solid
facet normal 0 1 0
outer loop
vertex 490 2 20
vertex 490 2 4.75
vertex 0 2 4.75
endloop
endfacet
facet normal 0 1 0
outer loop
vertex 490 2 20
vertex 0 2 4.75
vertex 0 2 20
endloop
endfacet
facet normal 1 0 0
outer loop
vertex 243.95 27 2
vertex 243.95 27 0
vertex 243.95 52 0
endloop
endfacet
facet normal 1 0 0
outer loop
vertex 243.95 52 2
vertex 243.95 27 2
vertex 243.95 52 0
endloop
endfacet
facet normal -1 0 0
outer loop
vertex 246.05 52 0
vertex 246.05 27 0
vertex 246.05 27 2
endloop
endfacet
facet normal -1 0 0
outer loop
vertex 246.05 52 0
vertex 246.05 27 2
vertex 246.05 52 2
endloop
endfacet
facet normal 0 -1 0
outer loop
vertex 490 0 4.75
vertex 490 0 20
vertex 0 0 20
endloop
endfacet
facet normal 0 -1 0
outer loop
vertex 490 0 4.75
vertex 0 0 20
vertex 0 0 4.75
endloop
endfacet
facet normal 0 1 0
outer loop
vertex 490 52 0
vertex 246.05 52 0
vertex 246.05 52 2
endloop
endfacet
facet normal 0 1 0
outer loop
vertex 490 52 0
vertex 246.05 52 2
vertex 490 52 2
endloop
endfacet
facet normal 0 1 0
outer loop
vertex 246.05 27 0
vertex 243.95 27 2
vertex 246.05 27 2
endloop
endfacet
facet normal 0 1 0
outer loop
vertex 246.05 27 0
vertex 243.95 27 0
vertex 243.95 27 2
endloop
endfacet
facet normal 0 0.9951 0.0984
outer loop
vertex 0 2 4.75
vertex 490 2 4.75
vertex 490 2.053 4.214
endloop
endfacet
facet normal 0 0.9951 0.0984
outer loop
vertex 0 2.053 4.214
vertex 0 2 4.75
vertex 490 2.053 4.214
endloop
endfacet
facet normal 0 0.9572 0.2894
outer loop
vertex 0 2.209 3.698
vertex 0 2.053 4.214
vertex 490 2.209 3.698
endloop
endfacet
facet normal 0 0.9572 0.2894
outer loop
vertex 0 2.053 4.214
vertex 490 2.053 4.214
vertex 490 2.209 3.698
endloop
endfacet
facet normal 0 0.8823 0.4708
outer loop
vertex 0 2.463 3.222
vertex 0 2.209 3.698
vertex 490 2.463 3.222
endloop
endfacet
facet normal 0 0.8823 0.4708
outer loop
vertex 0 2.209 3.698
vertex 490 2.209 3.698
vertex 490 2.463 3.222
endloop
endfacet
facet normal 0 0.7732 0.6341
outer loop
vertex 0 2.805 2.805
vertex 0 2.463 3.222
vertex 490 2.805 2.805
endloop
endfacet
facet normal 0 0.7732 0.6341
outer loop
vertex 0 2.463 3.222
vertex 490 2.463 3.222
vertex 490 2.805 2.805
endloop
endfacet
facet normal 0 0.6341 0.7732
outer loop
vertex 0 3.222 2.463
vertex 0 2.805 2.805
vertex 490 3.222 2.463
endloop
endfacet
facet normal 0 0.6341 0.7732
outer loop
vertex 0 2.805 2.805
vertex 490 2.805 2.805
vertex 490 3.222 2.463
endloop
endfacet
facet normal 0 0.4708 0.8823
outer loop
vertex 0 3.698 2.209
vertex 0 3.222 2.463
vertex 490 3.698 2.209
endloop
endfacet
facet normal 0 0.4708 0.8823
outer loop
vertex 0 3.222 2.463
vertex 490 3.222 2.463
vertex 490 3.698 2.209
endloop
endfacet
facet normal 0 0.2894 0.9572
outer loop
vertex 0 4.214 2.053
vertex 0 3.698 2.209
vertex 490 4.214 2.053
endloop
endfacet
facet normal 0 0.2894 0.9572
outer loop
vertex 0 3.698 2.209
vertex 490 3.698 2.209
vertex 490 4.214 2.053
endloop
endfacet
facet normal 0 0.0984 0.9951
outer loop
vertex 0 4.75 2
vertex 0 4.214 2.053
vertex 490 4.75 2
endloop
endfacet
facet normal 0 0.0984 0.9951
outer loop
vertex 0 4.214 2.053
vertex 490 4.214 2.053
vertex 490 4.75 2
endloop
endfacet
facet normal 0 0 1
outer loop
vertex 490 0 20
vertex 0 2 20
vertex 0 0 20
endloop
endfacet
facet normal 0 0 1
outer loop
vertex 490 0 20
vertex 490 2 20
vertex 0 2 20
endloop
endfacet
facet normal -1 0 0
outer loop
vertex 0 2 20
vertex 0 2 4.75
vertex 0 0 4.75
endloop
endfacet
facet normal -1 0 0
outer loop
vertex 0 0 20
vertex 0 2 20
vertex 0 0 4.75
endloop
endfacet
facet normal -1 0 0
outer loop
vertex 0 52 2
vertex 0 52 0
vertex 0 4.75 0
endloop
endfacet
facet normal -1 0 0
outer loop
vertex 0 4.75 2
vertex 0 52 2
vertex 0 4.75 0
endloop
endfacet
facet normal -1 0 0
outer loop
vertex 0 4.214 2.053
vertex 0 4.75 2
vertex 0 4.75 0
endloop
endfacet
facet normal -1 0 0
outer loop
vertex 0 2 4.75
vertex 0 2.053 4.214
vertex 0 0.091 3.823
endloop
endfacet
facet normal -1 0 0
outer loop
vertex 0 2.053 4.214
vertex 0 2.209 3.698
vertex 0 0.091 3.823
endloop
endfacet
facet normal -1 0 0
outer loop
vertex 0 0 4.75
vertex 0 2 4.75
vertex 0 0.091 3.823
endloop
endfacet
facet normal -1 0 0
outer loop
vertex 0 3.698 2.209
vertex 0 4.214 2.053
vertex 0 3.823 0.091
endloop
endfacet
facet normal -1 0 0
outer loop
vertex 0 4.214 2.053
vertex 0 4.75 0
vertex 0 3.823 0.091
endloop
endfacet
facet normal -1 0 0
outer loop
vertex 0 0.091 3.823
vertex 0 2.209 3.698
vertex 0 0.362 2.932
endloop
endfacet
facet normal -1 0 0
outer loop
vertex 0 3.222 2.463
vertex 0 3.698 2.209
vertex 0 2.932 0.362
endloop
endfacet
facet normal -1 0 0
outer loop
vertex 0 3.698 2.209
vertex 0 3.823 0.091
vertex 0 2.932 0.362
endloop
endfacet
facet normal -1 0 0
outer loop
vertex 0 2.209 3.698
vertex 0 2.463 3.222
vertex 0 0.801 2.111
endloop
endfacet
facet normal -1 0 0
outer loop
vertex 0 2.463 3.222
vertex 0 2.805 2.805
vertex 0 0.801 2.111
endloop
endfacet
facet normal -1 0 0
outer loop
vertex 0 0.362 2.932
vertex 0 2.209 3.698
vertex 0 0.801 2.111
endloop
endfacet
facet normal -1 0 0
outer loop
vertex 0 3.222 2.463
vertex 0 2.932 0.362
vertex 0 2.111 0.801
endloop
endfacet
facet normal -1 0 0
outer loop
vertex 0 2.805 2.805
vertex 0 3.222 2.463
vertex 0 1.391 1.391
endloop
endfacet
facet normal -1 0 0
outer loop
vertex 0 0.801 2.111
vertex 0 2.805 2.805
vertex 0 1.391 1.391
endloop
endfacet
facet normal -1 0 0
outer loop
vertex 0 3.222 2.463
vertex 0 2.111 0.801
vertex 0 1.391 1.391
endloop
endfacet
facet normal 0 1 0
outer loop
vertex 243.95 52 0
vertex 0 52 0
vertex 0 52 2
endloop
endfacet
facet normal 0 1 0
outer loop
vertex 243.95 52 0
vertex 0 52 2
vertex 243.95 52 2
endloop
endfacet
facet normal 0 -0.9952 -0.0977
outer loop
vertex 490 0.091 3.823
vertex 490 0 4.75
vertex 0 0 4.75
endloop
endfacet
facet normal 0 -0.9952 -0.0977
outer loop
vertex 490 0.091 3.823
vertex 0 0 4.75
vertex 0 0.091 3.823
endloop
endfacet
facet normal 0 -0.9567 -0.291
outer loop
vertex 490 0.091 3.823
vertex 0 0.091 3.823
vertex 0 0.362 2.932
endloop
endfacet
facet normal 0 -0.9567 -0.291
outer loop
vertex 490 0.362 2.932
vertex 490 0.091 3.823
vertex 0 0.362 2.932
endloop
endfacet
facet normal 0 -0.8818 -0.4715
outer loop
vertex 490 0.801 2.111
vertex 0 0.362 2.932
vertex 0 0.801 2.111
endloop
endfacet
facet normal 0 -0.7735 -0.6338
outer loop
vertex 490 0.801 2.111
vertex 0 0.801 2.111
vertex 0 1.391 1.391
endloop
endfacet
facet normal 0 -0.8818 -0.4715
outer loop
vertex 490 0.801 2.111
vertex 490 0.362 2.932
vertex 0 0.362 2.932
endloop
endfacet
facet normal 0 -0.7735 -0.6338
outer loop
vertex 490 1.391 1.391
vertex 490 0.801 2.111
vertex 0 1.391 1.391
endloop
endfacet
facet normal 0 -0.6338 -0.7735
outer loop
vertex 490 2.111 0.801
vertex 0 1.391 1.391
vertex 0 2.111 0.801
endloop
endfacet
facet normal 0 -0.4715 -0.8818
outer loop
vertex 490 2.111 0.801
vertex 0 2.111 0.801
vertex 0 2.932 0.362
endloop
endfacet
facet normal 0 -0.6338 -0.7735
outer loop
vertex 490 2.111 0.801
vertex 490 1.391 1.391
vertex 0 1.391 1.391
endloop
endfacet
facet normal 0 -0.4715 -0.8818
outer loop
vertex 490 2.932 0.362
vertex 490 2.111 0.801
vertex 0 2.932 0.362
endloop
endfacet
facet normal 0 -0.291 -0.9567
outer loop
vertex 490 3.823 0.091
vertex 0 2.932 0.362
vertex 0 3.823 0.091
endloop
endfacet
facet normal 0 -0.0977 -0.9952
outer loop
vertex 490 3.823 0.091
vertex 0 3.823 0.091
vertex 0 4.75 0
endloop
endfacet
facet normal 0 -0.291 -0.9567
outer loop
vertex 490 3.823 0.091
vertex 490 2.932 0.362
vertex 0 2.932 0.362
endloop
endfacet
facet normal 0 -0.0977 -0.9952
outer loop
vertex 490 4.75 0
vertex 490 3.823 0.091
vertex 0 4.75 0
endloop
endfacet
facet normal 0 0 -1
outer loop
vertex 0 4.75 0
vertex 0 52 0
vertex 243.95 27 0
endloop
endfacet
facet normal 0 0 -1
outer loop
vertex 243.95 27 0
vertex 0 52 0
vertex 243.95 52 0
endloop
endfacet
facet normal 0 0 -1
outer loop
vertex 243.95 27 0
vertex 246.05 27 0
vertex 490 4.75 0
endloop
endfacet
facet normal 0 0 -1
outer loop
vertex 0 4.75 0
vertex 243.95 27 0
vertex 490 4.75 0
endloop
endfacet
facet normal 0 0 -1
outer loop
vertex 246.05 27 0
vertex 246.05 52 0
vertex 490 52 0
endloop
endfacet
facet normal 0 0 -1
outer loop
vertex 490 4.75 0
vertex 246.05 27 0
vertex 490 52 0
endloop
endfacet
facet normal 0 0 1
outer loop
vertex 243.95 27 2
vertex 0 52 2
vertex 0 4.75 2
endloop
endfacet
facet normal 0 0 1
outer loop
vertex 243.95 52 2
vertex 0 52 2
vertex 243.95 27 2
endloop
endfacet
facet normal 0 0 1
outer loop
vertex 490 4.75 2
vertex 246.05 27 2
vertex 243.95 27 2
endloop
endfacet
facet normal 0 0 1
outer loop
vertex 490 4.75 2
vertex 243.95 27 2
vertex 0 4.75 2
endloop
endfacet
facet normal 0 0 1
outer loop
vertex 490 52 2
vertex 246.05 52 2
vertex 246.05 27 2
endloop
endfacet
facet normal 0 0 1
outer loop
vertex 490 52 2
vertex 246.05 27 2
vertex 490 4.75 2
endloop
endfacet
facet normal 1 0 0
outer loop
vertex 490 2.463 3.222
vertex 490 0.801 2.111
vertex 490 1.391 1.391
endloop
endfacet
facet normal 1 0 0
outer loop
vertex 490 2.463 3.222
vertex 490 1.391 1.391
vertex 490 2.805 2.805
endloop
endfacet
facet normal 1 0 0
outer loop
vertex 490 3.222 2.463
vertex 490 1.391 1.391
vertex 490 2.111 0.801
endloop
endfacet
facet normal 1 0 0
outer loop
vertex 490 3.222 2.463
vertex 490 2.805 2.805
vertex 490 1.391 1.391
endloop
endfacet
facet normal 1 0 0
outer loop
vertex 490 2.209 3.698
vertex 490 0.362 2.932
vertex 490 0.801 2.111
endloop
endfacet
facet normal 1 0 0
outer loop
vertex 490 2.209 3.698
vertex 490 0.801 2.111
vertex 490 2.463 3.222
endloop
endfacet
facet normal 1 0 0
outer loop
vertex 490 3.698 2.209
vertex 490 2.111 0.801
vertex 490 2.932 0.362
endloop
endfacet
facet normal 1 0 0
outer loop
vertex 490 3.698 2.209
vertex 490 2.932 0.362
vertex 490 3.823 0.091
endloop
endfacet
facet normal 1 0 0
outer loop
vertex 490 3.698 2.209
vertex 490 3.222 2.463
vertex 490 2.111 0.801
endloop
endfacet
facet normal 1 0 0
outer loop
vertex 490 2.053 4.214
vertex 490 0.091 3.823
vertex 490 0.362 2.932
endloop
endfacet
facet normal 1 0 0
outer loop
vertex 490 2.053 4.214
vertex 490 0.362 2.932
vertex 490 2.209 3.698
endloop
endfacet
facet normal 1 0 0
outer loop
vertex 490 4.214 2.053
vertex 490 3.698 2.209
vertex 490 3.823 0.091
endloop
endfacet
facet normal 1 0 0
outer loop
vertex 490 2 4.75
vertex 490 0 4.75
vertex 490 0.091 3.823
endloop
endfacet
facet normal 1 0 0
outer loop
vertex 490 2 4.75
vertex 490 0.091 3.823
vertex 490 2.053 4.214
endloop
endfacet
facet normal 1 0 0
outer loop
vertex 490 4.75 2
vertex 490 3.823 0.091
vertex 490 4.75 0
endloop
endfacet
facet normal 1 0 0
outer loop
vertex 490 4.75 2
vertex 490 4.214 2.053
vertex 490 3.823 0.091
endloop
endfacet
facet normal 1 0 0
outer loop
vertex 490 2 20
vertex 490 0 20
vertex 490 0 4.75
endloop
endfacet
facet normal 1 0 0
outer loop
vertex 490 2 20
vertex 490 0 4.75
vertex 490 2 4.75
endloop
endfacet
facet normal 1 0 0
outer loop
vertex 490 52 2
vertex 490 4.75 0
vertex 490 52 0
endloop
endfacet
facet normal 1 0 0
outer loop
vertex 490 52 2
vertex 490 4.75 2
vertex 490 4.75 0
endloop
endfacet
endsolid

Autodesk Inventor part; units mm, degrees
ref_plane "YZ Plane" through (0, 0, 0) normal (1, 0, 0) x (0, 1, 0)
ref_plane "XZ Plane" through (0, 0, 0) normal (0, 1, 0) x (-1, 0, 0)
ref_plane "XY Plane" through (0, 0, 0) normal (0, 0, 1) x (1, 0, 0)
sketch "Sketch1" plane through (0, 0, 0) normal (0, 0, 1) x (1, 0, 0)
  line L0 (-490, 52) -> (490, 52)
  line L1 (490, 52) -> (490, 0)
  line L2 (490, 0) -> (-490, 0)
  line L3 (-490, 0) -> (-490, 52)
  point P0 (0, 0)
  point P1 (0, 0)
  dimension "d0" = 980
  dimension "d1" = 52
extrude "Plate1" add sketch "Sketch1" along normal blind 2
sketch "Sketch2" plane through (490, 2, 0) normal (0, -1, 0) x (1, 0, 0)
  line L0 (-980, 0) -> (0, 0)
  line L1 (0, 0) -> (0, 20)
  line L2 (0, 20) -> (-980, 20)
  line L3 (-980, 20) -> (-980, 0)
edge flange "Flange1" height 20 angle 90 thickness 2 bend radius 2.75 thickness toward (0, -1, 0) relief round relief width 2 relief depth 1 edges at (0, 0, 2) wall of the first edge with corners at (-490, 2, 0) (490, 2, 0) (490, 2, 20) (-490, 2, 20)
bend "Bend1"
corner "Corner1"
sketch "Sketch11" plane through (0, 0, 0) normal (0, 0, 1) x (1, 0, 0)
  line L0 (-490, 52) -> (490, 52) projected
  circle A0 centre (0, 52) radius 30
  line L1 (-490, 0) -> (490, 0) projected
  line L2 (246.05, 0) -> (243.95, 0)
  line L3 (243.95, 0) -> (243.95, 27)
  line L4 (243.95, 27) -> (246.05, 27)
  line L5 (246.05, 27) -> (246.05, 0)
  line L6 (-243.95, 0) -> (-246.05, 0)
  line L7 (-246.05, 0) -> (-246.05, 27) construction
  line L8 (-246.05, 27) -> (-243.95, 27) construction
  line L9 (-243.95, 27) -> (-243.95, 0) construction
  line L10 (0, 52) -> (0, 0)
  line L11 (246.05, 27) -> (246.05, 52)
  line L12 (243.95, 27) -> (243.95, 52)
  line L13 (-243.95, 27) -> (-243.95, 52) construction
  line L14 (-246.05, 27) -> (-246.05, 52) construction
  line L15 (-490, 0) -> (-490, 52)
  circle A1 centre (490, 52) radius 30
  line L16 (490, 52) -> (490, 0)
  point P0 (30, 52)
  point P1 (-30, 52)
  point P2 (-245, 27)
  point P3 (245, 27)
  point P4 (490, 22)
  point P5 (460, 52)
  point P6 (0, 22)
  dimension "d44" = 60
  dimension "d47" = 2.1
  dimension "d49" = 490
  dimension "d50" = 27
extrude "Extrusion4" cut sketch "Sketch11" along normal through all both and the other way through all contours L10 A0 L0 | A0 L10 L1 L15 L0 | L0 L11 L4 L12 picked at (-19.7493, 49.7748)
sketch "Sketch9" plane through (0, 0, 2) normal (0, 0, 1) x (1, 0, 0)
  line L0 (456.3279, 23.6801) -> (456.3279, 11.6801) construction
  line L1 (456.3279, 11.6801) -> (256.3279, 11.6801) construction
  line L2 (256.3279, 11.6801) -> (256.3279, 23.6801) construction
  line L3 (256.3279, 23.6801) -> (456.3279, 23.6801) construction
  line L4 (-490, 52) -> (490, 52) projected
  point P0 (0, 0)
  point P1 (1, 52)
  dimension "d38" = 200
  dimension "d39" = 12
mark "Mark3"
equation "\"d1\" = СПИНА_Стрингер_1_высота"
equation "\"d2\" = Thickness"
equation "\"d3\" = BendReliefWidth"
equation "\"d4\" = BendReliefDepth"
equation "\"d5\" = MinimumRemnant"
equation "\"d6\" = TransitionRadius"
equation "\"d9\" = BendRadius"
equation "\"d10\" = CornerReliefSize"
equation "\"d11\" = GapSize"
equation "\"d12\" = JacobiRadiusSize"
equation "\"BendReliefWidth\" = Thickness"
equation "\"BendReliefDepth\" = 0.5 * Thickness"
equation "\"CornerReliefSize\" = 4 * Thickness"
equation "\"MinimumRemnant\" = 2 * Thickness"
equation "\"TransitionRadius\" = BendRadius"
equation "\"JacobiRadiusSize\" = BendRadius"
equation "\"GapSize\" = Thickness"
equation "\"СПИНА_Стрингер_1_высота\" = 52"
equation "\"Thickness\" = 2"
equation "\"BendRadius\" = 2.75"
properties part number "MSC 204 STRINGER BACK ^" material "Stainless Steel"
